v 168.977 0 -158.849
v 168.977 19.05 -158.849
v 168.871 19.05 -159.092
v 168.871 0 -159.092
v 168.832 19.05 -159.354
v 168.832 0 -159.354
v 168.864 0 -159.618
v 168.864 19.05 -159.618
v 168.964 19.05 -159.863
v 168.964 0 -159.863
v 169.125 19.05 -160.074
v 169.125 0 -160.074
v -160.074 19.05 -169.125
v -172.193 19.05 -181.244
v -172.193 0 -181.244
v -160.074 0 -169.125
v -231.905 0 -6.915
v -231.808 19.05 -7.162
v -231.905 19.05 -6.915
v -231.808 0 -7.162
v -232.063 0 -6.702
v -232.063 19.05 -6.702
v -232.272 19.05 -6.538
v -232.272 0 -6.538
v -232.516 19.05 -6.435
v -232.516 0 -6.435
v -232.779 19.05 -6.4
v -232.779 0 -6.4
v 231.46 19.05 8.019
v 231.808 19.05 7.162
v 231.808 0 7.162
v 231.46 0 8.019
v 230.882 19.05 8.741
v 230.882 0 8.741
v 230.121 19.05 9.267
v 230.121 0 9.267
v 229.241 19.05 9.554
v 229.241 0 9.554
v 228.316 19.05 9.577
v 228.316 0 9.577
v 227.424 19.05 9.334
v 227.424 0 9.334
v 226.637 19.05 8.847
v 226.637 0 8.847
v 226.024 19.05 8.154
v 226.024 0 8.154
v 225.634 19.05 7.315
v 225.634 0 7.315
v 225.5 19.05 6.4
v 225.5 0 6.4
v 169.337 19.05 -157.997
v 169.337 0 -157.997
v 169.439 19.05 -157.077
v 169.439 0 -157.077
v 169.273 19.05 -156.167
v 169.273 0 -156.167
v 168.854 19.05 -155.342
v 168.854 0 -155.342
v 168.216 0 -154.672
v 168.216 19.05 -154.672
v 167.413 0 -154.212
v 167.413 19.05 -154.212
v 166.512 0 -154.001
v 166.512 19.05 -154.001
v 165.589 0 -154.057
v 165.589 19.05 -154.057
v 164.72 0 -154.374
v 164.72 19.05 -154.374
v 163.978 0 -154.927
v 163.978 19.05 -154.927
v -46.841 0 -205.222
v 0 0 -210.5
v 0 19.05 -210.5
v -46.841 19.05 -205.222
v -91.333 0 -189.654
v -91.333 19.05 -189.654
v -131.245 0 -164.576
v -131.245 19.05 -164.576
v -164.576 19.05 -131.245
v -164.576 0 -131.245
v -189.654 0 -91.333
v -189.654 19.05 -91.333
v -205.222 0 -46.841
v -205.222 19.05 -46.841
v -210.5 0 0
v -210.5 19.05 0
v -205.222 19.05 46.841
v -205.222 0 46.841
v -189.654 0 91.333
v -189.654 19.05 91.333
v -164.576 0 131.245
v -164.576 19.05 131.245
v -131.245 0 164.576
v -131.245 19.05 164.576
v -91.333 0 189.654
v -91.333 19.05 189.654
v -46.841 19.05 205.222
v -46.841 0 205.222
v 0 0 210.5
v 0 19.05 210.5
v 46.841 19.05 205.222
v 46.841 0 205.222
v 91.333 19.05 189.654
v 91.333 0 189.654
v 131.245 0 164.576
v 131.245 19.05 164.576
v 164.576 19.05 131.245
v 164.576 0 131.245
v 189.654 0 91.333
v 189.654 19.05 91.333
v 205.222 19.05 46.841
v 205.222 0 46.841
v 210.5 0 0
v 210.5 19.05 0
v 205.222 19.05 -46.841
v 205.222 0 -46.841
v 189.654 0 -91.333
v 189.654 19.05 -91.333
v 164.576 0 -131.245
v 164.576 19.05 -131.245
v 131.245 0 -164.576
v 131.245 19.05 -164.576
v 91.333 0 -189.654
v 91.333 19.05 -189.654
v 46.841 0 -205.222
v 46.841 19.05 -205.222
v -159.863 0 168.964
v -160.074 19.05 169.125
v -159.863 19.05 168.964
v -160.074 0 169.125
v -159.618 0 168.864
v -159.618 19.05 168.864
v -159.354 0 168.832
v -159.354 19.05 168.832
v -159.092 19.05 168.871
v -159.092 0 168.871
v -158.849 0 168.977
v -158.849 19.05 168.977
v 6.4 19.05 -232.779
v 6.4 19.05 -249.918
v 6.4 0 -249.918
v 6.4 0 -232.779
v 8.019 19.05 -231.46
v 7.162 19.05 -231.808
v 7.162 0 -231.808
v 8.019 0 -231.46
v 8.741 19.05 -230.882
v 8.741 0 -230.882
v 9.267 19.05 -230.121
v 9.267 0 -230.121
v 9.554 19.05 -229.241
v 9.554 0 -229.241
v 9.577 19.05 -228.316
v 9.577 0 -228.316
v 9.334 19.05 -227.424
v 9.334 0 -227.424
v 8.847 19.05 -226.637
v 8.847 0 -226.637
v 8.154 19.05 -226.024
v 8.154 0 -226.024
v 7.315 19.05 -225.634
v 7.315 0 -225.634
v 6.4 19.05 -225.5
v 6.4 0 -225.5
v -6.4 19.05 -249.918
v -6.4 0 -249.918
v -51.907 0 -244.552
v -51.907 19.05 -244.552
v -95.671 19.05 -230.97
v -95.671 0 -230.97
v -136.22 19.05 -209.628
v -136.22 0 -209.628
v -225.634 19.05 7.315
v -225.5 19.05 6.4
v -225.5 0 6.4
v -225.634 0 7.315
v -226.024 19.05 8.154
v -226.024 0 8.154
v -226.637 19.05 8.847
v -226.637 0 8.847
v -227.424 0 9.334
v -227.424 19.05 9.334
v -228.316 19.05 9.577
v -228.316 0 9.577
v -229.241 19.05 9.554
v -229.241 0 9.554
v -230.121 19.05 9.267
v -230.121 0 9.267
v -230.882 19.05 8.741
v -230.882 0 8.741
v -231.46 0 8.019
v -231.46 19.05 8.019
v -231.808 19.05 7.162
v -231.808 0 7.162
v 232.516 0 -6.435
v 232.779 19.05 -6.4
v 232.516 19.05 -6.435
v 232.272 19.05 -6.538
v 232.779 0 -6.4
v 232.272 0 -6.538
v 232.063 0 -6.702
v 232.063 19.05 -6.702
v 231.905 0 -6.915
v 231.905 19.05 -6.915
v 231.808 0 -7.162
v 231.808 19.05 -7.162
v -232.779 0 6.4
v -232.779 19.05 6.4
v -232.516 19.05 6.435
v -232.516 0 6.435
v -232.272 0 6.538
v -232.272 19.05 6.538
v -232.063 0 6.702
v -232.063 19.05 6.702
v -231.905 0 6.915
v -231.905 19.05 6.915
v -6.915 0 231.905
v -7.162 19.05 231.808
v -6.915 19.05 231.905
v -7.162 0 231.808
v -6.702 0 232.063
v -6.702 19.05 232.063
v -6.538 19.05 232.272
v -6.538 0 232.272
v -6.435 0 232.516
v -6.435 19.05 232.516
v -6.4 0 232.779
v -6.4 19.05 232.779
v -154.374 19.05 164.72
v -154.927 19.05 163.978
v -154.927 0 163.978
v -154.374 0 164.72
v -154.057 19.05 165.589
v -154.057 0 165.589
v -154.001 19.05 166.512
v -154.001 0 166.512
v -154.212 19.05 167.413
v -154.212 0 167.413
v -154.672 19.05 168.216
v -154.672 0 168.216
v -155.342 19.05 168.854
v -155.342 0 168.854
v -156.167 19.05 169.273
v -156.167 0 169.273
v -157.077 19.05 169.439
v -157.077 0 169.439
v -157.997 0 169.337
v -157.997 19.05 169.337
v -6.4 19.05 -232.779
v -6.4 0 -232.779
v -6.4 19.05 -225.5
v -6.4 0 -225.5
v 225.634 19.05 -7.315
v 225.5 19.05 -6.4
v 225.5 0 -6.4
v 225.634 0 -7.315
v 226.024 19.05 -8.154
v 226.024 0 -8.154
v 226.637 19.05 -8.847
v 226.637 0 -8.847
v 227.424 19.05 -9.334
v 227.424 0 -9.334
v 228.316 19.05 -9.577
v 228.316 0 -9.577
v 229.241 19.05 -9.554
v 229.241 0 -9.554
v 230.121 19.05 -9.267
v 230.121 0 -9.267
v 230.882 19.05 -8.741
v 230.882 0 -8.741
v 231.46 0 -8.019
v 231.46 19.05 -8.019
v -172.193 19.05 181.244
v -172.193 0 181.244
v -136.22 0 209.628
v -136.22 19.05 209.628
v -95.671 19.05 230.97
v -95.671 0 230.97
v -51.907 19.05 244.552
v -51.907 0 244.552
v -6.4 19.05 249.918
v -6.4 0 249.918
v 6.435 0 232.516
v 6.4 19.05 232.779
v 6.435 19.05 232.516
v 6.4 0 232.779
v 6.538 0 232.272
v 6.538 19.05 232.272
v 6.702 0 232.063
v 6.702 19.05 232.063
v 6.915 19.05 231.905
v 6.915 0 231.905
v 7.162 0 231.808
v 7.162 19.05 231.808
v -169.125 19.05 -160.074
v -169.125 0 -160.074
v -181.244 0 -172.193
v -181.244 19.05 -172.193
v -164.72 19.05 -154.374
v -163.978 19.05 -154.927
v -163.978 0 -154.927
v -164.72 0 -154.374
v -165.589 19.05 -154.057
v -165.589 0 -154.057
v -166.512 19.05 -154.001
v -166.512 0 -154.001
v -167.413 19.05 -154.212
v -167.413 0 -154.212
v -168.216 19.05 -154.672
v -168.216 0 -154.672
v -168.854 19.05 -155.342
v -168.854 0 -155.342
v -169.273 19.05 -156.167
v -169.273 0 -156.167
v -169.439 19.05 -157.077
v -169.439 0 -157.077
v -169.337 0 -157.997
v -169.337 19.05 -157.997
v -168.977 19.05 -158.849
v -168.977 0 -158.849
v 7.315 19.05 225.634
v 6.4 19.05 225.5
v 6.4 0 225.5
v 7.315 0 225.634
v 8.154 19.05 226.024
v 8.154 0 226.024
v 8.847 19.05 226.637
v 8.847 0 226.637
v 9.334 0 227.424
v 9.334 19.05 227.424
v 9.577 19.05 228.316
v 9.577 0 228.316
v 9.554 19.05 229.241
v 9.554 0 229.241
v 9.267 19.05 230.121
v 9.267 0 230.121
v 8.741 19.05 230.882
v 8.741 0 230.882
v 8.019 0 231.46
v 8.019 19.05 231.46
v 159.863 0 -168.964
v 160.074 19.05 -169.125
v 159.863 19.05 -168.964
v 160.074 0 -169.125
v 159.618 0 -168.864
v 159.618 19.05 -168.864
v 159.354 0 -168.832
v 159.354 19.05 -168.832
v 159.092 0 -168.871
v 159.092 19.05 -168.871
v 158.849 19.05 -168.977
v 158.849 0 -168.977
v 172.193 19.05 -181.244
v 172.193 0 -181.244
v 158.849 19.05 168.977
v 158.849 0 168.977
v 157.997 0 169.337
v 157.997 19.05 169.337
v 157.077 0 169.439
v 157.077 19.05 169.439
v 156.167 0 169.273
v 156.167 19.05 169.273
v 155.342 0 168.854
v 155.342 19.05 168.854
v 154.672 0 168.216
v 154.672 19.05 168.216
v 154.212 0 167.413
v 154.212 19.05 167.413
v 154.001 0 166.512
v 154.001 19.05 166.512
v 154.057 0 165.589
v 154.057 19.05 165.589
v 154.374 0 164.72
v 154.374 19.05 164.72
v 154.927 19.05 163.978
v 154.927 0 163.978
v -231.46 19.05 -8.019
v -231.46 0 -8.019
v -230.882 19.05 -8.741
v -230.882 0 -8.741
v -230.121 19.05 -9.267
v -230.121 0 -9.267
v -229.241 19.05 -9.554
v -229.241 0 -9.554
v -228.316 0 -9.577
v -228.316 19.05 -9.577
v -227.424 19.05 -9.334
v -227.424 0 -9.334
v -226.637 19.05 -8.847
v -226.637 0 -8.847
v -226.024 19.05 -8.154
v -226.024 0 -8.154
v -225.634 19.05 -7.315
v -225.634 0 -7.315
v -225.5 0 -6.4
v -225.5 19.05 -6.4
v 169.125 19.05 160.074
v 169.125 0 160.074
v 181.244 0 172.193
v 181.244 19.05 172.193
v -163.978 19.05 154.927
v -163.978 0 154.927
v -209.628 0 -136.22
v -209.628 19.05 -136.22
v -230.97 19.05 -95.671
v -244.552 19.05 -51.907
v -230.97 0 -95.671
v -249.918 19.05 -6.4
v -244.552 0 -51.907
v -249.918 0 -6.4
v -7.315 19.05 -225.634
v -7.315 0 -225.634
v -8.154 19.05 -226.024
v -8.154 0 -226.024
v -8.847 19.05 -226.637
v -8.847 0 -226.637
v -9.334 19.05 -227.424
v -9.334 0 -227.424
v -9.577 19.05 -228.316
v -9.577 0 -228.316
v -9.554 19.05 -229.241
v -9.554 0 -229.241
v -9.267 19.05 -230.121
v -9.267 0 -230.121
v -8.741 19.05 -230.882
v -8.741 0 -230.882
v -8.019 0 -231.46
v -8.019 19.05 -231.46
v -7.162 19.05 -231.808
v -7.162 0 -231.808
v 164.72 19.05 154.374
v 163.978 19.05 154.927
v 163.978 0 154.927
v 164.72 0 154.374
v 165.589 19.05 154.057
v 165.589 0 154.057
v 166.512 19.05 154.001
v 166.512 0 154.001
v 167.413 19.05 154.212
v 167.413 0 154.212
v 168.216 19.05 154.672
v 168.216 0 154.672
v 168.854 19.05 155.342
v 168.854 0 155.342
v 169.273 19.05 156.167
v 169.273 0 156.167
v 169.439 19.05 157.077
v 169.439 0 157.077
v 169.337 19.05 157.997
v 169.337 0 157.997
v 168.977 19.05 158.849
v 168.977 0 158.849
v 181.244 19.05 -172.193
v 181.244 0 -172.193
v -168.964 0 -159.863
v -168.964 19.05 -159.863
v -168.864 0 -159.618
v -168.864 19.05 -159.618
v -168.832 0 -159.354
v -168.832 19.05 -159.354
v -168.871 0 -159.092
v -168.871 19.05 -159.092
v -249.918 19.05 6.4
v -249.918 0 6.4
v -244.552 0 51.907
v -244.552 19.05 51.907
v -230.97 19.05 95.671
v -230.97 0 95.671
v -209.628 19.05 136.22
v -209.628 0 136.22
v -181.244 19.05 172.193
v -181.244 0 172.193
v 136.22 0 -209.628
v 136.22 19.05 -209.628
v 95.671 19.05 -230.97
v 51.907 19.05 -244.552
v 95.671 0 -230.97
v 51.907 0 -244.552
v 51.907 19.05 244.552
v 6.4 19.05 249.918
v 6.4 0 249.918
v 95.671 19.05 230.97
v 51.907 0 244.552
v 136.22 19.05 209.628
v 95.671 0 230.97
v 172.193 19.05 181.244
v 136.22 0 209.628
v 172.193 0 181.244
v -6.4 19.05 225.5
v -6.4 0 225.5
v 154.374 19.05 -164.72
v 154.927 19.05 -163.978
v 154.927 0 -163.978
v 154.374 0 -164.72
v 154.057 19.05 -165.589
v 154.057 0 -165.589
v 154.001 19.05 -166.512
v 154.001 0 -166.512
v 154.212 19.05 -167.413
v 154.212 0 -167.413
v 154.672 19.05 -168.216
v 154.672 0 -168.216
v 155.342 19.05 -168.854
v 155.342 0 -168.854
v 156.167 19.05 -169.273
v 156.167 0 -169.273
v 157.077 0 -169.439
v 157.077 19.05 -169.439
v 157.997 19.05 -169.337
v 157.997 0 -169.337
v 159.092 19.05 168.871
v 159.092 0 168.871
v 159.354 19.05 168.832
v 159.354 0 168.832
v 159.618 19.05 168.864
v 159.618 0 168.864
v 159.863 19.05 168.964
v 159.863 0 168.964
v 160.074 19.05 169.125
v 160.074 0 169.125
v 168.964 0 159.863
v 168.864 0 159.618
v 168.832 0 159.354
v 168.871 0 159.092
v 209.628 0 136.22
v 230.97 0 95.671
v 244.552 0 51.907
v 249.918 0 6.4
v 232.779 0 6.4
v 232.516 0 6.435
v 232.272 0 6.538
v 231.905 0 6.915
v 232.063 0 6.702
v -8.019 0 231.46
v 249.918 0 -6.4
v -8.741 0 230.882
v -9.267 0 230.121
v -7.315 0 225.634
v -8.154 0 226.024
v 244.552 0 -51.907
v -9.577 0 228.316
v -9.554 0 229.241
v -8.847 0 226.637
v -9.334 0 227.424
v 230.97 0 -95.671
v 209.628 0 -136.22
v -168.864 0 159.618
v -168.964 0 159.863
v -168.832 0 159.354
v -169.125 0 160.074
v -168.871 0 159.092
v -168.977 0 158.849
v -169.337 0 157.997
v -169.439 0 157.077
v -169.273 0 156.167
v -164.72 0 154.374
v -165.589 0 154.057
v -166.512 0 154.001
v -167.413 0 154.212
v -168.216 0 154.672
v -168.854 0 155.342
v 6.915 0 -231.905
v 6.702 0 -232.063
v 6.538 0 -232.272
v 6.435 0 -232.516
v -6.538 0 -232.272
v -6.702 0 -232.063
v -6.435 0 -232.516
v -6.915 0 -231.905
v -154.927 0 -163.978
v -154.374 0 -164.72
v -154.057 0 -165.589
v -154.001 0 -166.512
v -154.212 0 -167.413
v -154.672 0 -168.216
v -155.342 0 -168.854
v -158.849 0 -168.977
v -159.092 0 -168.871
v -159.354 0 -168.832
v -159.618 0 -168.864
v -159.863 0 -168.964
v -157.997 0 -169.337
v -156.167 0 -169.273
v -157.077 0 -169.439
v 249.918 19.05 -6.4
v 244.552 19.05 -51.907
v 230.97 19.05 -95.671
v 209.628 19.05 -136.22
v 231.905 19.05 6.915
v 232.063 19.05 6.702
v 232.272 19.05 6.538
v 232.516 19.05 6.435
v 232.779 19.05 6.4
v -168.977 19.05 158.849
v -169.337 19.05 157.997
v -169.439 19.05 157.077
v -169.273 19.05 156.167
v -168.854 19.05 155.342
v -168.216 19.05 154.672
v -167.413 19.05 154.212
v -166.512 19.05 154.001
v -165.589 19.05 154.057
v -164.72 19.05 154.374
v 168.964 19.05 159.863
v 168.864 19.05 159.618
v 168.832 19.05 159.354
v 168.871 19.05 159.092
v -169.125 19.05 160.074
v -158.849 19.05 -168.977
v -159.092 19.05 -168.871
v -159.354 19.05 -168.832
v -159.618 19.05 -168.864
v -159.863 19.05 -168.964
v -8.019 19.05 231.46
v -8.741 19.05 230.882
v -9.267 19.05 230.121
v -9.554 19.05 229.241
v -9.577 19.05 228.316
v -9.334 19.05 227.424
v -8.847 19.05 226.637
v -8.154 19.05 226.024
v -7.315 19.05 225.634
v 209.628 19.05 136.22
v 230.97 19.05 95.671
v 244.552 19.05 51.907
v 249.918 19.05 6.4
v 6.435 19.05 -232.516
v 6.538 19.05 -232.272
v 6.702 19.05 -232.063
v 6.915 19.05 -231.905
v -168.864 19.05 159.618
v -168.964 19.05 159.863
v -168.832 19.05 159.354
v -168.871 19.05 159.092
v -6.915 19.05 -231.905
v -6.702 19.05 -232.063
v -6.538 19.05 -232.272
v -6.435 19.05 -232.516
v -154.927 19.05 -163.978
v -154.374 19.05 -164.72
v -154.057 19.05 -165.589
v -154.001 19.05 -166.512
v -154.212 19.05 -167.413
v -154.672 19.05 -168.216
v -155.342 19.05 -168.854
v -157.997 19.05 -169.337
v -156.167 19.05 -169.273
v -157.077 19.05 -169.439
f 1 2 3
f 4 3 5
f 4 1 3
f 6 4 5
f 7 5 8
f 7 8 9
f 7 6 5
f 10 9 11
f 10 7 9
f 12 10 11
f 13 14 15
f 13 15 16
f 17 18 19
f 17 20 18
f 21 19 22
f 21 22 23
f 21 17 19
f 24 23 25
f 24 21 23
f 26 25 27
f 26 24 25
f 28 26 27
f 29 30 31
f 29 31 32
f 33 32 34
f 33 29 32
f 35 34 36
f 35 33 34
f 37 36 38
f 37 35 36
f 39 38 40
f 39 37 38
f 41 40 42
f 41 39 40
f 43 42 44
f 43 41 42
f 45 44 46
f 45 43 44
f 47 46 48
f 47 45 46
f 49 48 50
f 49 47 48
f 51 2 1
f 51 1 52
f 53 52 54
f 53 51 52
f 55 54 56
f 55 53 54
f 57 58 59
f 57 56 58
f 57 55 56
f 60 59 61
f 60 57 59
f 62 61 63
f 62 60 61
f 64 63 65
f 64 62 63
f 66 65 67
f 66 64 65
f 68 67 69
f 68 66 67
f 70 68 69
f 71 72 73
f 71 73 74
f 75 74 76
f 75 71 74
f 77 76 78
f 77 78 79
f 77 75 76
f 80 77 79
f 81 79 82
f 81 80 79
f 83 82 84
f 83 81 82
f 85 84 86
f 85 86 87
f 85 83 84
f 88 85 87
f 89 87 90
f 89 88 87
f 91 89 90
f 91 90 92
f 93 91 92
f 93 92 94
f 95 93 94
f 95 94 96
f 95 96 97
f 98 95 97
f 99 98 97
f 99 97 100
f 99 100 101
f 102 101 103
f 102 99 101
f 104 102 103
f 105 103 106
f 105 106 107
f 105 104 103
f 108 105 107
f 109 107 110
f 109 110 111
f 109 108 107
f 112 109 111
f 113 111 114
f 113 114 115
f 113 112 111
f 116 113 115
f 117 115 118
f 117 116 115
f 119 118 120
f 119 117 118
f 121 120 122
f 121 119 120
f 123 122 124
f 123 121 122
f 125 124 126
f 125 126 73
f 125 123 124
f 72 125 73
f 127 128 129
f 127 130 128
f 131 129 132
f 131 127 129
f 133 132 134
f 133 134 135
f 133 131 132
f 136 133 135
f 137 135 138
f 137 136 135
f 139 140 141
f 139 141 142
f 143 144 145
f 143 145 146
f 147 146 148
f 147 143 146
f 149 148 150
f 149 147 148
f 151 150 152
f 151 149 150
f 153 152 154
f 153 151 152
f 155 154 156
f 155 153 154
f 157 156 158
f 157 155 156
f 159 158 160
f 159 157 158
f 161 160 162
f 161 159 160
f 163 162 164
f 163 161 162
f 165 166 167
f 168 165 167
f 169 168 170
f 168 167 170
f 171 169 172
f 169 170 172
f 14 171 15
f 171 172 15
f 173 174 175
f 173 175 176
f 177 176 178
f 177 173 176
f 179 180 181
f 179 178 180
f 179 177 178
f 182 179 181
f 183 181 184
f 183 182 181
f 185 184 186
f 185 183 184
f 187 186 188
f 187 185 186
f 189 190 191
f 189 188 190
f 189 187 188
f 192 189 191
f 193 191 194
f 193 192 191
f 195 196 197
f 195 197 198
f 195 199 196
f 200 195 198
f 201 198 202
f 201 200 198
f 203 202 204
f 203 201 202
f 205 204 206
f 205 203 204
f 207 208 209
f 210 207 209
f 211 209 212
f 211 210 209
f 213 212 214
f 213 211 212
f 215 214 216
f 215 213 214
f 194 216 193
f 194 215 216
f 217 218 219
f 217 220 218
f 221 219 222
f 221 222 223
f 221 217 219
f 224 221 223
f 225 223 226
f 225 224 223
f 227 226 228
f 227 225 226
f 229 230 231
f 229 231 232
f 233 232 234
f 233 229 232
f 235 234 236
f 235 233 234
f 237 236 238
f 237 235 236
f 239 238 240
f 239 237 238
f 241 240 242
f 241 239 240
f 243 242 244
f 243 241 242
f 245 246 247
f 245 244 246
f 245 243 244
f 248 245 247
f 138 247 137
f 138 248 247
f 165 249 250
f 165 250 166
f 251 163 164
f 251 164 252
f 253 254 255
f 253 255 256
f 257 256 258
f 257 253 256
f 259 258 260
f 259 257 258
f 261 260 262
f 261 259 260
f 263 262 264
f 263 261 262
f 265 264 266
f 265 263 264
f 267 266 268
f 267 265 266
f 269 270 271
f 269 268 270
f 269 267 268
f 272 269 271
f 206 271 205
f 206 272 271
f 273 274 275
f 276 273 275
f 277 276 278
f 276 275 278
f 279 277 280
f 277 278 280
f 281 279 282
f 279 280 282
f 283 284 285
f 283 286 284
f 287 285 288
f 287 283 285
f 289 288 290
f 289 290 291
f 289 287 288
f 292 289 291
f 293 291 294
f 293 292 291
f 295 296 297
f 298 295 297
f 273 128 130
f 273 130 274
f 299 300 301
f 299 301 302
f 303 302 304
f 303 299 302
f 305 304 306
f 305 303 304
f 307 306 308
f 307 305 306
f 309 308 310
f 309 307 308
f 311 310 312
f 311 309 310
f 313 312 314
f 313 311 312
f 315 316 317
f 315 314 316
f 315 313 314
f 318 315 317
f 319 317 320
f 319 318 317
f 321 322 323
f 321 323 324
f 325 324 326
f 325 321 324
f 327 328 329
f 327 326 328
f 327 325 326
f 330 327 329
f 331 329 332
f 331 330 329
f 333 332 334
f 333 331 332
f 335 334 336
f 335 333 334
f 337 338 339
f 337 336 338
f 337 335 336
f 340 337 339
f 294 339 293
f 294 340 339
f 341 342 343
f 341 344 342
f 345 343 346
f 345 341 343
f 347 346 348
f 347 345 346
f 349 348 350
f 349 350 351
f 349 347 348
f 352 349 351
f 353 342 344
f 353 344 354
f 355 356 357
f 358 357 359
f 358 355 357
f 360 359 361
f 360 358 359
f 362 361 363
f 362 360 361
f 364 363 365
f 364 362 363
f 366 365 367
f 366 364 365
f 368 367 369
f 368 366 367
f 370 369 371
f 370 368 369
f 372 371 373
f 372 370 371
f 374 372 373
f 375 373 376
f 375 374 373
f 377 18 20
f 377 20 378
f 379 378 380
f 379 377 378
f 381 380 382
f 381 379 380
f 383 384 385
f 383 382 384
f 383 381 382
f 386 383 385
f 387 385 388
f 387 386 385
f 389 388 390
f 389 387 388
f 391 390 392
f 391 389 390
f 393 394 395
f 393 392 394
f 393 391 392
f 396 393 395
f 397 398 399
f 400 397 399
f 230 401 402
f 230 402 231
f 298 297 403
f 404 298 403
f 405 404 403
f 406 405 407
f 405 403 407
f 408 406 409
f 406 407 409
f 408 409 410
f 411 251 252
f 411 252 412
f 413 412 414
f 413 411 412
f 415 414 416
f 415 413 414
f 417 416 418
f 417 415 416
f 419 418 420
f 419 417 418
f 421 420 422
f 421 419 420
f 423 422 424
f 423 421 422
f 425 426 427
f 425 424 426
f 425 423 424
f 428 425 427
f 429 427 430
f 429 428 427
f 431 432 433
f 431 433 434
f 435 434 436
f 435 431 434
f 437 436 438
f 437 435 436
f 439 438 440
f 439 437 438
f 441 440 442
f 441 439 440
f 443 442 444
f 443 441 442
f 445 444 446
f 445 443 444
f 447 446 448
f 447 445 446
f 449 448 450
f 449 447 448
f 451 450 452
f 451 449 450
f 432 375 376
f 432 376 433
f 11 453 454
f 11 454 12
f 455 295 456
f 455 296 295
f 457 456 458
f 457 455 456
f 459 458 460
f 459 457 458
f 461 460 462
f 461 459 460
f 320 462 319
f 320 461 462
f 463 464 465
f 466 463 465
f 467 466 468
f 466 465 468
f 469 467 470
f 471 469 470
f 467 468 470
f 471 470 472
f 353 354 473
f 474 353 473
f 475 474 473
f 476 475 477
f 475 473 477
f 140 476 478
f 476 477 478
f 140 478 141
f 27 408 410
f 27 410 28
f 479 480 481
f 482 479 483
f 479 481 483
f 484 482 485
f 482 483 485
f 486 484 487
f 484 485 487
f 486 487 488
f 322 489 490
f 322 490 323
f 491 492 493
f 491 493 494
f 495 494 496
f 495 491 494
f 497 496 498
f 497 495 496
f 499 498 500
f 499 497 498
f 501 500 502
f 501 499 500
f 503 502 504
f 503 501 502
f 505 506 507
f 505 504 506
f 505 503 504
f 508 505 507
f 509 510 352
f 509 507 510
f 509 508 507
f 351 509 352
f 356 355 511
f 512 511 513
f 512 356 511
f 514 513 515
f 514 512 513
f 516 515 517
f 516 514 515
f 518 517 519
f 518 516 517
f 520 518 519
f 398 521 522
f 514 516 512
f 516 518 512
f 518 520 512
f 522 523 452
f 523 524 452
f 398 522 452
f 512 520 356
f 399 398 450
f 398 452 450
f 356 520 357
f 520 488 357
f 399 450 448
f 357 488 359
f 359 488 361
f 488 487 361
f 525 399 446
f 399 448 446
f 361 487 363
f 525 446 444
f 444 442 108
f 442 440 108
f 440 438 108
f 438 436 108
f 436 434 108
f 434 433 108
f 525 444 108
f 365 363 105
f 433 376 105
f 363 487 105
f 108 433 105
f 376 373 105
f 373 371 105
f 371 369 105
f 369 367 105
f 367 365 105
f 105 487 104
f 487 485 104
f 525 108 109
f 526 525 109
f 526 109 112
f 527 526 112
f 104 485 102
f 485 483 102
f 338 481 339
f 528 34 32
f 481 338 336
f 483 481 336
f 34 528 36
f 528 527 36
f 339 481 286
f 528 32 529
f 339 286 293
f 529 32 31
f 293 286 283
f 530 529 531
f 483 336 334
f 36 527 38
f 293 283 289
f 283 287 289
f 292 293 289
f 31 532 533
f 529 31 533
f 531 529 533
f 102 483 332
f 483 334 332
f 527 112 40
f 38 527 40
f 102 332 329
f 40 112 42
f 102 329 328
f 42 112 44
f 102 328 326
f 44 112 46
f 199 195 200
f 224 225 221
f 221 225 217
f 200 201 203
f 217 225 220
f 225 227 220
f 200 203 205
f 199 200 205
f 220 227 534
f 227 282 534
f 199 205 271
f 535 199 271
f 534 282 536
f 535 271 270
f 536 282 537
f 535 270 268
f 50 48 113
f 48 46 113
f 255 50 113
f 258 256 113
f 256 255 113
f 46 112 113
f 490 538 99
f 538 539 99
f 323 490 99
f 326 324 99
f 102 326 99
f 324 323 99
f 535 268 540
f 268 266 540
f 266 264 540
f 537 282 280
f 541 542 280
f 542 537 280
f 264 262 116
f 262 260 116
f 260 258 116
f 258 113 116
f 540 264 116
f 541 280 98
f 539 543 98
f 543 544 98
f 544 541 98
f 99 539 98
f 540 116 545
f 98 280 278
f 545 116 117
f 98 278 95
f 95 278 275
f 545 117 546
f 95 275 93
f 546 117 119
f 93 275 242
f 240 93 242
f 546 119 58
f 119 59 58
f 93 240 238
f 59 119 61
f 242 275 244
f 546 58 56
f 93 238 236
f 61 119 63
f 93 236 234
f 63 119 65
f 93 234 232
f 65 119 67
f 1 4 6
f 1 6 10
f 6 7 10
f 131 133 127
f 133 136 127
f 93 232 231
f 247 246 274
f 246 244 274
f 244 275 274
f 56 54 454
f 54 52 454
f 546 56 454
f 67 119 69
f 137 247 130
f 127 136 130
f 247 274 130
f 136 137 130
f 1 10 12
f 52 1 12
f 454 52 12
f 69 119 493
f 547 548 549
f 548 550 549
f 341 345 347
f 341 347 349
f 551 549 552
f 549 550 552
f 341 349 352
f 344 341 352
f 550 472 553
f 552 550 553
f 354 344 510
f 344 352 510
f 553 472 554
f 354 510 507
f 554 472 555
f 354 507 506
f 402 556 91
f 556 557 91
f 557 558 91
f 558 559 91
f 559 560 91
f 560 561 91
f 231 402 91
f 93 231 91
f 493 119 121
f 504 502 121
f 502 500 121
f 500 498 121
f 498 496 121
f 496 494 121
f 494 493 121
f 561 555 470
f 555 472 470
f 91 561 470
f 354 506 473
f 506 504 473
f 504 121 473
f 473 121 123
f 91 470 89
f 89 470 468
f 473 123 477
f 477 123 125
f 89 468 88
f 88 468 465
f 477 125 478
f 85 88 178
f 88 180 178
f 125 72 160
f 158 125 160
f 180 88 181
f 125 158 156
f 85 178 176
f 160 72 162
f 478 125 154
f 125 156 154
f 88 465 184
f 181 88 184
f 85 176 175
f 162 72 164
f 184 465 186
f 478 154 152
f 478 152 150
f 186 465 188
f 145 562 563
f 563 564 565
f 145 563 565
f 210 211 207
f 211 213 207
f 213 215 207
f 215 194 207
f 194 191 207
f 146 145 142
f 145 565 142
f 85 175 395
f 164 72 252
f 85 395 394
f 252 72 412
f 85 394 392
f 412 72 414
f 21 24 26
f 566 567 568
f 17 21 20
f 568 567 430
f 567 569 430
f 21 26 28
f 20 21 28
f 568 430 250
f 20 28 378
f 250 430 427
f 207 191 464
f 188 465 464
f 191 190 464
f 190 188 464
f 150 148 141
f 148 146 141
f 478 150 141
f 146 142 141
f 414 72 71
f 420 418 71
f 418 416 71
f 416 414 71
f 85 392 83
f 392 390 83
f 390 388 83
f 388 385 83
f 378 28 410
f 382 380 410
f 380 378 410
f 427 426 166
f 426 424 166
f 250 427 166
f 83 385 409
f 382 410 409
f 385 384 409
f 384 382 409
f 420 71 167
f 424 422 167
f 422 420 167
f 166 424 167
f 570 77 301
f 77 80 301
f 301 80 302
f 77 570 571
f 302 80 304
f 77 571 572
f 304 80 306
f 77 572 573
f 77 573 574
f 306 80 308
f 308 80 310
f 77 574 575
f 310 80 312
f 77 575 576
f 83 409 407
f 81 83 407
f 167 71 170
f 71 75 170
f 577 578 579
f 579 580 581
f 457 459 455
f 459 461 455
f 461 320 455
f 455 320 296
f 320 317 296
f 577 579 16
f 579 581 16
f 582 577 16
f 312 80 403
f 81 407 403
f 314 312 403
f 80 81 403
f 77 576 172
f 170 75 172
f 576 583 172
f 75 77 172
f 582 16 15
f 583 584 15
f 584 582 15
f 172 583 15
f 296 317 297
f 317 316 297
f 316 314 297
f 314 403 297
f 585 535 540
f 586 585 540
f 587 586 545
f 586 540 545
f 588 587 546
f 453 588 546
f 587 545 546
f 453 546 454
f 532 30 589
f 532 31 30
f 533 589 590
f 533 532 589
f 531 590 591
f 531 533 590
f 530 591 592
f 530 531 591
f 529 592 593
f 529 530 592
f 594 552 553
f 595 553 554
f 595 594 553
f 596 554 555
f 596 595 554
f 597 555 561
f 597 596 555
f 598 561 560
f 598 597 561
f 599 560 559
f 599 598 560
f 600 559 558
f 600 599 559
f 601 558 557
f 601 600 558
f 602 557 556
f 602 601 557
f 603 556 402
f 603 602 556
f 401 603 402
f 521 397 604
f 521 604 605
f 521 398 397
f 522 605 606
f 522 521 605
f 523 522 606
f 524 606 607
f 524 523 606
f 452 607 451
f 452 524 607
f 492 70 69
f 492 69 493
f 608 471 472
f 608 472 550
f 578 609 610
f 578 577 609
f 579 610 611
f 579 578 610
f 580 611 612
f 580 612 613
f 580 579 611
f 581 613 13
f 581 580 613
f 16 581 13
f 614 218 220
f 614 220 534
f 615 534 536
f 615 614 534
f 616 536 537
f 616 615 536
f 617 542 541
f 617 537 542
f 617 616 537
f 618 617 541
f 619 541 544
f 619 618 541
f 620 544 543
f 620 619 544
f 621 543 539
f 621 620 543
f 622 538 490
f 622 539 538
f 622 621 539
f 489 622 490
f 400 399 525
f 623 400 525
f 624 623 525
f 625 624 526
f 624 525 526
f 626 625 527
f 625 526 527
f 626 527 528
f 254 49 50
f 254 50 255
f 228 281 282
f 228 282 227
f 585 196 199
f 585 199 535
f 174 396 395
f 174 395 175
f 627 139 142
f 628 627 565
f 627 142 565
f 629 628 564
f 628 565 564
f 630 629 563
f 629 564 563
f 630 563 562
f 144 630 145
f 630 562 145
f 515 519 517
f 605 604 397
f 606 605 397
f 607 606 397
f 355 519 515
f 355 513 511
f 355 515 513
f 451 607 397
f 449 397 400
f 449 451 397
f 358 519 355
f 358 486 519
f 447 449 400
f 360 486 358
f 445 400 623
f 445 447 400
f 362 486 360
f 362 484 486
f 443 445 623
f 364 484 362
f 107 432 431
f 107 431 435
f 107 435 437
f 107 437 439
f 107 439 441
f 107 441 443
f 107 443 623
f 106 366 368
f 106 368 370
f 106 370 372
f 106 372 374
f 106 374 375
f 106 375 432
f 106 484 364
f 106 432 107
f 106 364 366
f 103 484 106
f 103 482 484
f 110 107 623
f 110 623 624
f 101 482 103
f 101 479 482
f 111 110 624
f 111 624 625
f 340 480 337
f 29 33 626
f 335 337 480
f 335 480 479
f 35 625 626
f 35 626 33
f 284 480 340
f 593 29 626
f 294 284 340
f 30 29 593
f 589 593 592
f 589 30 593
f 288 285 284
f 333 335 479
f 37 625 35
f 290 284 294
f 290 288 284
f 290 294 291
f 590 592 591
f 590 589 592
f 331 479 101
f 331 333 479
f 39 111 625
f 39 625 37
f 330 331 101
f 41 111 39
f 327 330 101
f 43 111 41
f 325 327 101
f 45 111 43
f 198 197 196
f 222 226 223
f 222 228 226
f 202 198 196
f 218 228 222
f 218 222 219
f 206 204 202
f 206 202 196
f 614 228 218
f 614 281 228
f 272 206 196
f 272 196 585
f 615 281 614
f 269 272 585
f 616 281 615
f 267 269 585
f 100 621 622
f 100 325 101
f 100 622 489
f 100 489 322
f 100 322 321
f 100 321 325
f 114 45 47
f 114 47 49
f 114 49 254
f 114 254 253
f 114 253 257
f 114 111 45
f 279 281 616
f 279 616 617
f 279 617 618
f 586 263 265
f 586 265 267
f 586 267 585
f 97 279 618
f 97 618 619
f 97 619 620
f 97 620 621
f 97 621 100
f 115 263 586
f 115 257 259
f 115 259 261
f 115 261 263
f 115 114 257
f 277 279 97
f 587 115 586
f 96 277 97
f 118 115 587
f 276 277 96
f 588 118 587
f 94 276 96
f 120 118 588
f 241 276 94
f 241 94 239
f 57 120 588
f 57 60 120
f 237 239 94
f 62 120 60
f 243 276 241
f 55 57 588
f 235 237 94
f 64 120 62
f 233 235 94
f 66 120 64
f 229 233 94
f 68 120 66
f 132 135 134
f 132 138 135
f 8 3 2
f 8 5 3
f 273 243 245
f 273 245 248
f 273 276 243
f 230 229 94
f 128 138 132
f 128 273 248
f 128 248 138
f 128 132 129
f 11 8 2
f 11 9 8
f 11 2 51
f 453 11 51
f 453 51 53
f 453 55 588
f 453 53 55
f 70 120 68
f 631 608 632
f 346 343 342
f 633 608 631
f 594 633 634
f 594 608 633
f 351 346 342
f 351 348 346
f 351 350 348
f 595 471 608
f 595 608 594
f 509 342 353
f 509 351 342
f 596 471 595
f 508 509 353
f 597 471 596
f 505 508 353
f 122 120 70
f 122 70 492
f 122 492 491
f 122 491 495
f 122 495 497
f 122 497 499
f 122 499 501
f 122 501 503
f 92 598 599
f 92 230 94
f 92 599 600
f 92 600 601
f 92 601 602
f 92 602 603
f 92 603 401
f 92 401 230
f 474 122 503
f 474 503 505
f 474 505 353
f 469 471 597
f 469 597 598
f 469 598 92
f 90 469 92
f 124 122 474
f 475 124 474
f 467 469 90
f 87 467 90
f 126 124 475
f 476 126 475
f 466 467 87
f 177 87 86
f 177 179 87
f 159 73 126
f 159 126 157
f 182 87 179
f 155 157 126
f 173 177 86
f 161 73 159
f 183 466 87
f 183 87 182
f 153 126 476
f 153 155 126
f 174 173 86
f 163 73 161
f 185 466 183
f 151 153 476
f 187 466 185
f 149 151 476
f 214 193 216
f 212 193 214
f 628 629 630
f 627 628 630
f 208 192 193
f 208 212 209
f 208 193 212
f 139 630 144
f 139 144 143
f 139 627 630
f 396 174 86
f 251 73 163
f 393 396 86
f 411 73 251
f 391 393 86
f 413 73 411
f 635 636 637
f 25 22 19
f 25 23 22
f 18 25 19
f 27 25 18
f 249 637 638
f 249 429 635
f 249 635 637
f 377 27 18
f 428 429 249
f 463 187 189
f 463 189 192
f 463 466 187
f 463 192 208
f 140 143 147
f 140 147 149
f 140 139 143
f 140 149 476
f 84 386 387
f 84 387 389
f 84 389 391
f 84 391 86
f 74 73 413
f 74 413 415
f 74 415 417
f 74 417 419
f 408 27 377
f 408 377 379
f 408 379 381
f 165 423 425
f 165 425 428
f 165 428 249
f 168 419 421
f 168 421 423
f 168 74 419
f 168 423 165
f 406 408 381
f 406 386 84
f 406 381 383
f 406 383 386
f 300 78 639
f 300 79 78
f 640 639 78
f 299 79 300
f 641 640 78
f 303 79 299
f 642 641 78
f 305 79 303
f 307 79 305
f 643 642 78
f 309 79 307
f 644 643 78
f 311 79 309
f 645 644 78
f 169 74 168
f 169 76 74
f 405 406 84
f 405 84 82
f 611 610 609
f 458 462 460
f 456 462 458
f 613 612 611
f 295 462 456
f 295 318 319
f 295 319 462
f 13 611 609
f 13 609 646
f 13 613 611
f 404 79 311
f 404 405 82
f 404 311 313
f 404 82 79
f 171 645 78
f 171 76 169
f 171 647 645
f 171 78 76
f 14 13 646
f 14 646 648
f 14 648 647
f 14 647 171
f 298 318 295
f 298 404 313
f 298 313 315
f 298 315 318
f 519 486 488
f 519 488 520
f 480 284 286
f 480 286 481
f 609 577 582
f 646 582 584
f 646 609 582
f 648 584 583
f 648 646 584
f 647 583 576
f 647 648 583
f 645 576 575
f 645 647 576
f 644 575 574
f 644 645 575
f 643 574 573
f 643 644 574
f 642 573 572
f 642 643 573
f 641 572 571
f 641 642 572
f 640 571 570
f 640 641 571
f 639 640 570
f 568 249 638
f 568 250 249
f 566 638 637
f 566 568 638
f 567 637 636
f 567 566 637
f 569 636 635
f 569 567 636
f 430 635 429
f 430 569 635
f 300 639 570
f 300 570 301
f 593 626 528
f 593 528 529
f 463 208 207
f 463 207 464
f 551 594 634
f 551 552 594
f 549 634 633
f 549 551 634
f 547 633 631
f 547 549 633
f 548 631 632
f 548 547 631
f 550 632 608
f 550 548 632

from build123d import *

# Parameters (mm, degrees)
SKETCH1_R                = 250
SKETCH1_R_2              = 210.5
BOSS_EXTRUDE1_DEPTH      = 19.05
CUT_EXTRUDE1_DEPTH       = 355.066240272
FILLET1_R                = 1
CIRPATTERN1_COUNT        = 8
FILLET1_OF_CIRPATTERN1_R = 1


with BuildPart() as part:
    # Sketch1 → Boss-Extrude1 (new body)
    with BuildSketch(Plane(origin=(0, 0, 0), x_dir=(1, 0, 0), z_dir=(0, 1, 0))):
        with Locations(Location((0, 0, 0), (0, 0, 90))):
            Circle(SKETCH1_R)
        with Locations(Location((0, 0, 0), (0, 0, 90))):
            Circle(SKETCH1_R_2, mode=Mode.SUBTRACT)
    extrude(amount=BOSS_EXTRUDE1_DEPTH)

    # Sketch2 → Cut-Extrude1 (cut, through all)
    with BuildSketch(Plane(origin=(0, 19.05, 0), x_dir=(1, 0, 0), z_dir=(0, 1, 0))):
        with BuildLine():
            Line((6.4, 225.5), (-6.4, 225.5))
            ThreePointArc((-6.4, 225.5), (-9.6, 228.7), (-6.4, 231.9))
            Line((-6.4, 231.9), (-6.4, 250))
            Line((-6.4, 250), (6.4, 250))
            Line((6.4, 250), (6.4, 231.9))
            ThreePointArc((6.4, 231.9), (9.6, 228.7), (6.4, 225.5))
        make_face()
    cut_extrude1 = extrude(amount=-CUT_EXTRUDE1_DEPTH, mode=Mode.SUBTRACT)

    # Fillet1
    fillet1_edges = [part.edges().sort_by_distance(p)[0] for p in [
        (-6.4, 9.525, -231.9),
        (6.4, 9.525, -231.9),
    ]]
    fillet(fillet1_edges, radius=FILLET1_R)

    # CirPattern1: Cut-Extrude1 ×8 about axis
    cirpattern1_axis = Axis((0, 0, 0), (0, 1, 0))
    for i in range(1, CIRPATTERN1_COUNT):
        add(cut_extrude1.rotate(cirpattern1_axis, i * 360 / CIRPATTERN1_COUNT), mode=Mode.SUBTRACT)

    # Fillet1 of CirPattern1
    fillet1_of_cirpattern1_edges = [part.edges().sort_by_distance(p)[0] for p in [
        (-168.503545957, 9.525, -159.452579158),
        (-159.452579158, 9.525, -168.503545957),
        (-231.9, 9.525, 6.4),
        (-231.9, 9.525, -6.4),
        (-159.452579158, 9.525, 168.503545957),
        (-168.503545957, 9.525, 159.452579158),
        (6.4, 9.525, 231.9),
        (-6.4, 9.525, 231.9),
        (168.503545957, 9.525, 159.452579158),
        (159.452579158, 9.525, 168.503545957),
        (231.9, 9.525, -6.4),
        (231.9, 9.525, 6.4),
        (159.452579158, 9.525, -168.503545957),
        (168.503545957, 9.525, -159.452579158),
    ]]
    fillet(fillet1_of_cirpattern1_edges, radius=FILLET1_OF_CIRPATTERN1_R)


solid = part.part
